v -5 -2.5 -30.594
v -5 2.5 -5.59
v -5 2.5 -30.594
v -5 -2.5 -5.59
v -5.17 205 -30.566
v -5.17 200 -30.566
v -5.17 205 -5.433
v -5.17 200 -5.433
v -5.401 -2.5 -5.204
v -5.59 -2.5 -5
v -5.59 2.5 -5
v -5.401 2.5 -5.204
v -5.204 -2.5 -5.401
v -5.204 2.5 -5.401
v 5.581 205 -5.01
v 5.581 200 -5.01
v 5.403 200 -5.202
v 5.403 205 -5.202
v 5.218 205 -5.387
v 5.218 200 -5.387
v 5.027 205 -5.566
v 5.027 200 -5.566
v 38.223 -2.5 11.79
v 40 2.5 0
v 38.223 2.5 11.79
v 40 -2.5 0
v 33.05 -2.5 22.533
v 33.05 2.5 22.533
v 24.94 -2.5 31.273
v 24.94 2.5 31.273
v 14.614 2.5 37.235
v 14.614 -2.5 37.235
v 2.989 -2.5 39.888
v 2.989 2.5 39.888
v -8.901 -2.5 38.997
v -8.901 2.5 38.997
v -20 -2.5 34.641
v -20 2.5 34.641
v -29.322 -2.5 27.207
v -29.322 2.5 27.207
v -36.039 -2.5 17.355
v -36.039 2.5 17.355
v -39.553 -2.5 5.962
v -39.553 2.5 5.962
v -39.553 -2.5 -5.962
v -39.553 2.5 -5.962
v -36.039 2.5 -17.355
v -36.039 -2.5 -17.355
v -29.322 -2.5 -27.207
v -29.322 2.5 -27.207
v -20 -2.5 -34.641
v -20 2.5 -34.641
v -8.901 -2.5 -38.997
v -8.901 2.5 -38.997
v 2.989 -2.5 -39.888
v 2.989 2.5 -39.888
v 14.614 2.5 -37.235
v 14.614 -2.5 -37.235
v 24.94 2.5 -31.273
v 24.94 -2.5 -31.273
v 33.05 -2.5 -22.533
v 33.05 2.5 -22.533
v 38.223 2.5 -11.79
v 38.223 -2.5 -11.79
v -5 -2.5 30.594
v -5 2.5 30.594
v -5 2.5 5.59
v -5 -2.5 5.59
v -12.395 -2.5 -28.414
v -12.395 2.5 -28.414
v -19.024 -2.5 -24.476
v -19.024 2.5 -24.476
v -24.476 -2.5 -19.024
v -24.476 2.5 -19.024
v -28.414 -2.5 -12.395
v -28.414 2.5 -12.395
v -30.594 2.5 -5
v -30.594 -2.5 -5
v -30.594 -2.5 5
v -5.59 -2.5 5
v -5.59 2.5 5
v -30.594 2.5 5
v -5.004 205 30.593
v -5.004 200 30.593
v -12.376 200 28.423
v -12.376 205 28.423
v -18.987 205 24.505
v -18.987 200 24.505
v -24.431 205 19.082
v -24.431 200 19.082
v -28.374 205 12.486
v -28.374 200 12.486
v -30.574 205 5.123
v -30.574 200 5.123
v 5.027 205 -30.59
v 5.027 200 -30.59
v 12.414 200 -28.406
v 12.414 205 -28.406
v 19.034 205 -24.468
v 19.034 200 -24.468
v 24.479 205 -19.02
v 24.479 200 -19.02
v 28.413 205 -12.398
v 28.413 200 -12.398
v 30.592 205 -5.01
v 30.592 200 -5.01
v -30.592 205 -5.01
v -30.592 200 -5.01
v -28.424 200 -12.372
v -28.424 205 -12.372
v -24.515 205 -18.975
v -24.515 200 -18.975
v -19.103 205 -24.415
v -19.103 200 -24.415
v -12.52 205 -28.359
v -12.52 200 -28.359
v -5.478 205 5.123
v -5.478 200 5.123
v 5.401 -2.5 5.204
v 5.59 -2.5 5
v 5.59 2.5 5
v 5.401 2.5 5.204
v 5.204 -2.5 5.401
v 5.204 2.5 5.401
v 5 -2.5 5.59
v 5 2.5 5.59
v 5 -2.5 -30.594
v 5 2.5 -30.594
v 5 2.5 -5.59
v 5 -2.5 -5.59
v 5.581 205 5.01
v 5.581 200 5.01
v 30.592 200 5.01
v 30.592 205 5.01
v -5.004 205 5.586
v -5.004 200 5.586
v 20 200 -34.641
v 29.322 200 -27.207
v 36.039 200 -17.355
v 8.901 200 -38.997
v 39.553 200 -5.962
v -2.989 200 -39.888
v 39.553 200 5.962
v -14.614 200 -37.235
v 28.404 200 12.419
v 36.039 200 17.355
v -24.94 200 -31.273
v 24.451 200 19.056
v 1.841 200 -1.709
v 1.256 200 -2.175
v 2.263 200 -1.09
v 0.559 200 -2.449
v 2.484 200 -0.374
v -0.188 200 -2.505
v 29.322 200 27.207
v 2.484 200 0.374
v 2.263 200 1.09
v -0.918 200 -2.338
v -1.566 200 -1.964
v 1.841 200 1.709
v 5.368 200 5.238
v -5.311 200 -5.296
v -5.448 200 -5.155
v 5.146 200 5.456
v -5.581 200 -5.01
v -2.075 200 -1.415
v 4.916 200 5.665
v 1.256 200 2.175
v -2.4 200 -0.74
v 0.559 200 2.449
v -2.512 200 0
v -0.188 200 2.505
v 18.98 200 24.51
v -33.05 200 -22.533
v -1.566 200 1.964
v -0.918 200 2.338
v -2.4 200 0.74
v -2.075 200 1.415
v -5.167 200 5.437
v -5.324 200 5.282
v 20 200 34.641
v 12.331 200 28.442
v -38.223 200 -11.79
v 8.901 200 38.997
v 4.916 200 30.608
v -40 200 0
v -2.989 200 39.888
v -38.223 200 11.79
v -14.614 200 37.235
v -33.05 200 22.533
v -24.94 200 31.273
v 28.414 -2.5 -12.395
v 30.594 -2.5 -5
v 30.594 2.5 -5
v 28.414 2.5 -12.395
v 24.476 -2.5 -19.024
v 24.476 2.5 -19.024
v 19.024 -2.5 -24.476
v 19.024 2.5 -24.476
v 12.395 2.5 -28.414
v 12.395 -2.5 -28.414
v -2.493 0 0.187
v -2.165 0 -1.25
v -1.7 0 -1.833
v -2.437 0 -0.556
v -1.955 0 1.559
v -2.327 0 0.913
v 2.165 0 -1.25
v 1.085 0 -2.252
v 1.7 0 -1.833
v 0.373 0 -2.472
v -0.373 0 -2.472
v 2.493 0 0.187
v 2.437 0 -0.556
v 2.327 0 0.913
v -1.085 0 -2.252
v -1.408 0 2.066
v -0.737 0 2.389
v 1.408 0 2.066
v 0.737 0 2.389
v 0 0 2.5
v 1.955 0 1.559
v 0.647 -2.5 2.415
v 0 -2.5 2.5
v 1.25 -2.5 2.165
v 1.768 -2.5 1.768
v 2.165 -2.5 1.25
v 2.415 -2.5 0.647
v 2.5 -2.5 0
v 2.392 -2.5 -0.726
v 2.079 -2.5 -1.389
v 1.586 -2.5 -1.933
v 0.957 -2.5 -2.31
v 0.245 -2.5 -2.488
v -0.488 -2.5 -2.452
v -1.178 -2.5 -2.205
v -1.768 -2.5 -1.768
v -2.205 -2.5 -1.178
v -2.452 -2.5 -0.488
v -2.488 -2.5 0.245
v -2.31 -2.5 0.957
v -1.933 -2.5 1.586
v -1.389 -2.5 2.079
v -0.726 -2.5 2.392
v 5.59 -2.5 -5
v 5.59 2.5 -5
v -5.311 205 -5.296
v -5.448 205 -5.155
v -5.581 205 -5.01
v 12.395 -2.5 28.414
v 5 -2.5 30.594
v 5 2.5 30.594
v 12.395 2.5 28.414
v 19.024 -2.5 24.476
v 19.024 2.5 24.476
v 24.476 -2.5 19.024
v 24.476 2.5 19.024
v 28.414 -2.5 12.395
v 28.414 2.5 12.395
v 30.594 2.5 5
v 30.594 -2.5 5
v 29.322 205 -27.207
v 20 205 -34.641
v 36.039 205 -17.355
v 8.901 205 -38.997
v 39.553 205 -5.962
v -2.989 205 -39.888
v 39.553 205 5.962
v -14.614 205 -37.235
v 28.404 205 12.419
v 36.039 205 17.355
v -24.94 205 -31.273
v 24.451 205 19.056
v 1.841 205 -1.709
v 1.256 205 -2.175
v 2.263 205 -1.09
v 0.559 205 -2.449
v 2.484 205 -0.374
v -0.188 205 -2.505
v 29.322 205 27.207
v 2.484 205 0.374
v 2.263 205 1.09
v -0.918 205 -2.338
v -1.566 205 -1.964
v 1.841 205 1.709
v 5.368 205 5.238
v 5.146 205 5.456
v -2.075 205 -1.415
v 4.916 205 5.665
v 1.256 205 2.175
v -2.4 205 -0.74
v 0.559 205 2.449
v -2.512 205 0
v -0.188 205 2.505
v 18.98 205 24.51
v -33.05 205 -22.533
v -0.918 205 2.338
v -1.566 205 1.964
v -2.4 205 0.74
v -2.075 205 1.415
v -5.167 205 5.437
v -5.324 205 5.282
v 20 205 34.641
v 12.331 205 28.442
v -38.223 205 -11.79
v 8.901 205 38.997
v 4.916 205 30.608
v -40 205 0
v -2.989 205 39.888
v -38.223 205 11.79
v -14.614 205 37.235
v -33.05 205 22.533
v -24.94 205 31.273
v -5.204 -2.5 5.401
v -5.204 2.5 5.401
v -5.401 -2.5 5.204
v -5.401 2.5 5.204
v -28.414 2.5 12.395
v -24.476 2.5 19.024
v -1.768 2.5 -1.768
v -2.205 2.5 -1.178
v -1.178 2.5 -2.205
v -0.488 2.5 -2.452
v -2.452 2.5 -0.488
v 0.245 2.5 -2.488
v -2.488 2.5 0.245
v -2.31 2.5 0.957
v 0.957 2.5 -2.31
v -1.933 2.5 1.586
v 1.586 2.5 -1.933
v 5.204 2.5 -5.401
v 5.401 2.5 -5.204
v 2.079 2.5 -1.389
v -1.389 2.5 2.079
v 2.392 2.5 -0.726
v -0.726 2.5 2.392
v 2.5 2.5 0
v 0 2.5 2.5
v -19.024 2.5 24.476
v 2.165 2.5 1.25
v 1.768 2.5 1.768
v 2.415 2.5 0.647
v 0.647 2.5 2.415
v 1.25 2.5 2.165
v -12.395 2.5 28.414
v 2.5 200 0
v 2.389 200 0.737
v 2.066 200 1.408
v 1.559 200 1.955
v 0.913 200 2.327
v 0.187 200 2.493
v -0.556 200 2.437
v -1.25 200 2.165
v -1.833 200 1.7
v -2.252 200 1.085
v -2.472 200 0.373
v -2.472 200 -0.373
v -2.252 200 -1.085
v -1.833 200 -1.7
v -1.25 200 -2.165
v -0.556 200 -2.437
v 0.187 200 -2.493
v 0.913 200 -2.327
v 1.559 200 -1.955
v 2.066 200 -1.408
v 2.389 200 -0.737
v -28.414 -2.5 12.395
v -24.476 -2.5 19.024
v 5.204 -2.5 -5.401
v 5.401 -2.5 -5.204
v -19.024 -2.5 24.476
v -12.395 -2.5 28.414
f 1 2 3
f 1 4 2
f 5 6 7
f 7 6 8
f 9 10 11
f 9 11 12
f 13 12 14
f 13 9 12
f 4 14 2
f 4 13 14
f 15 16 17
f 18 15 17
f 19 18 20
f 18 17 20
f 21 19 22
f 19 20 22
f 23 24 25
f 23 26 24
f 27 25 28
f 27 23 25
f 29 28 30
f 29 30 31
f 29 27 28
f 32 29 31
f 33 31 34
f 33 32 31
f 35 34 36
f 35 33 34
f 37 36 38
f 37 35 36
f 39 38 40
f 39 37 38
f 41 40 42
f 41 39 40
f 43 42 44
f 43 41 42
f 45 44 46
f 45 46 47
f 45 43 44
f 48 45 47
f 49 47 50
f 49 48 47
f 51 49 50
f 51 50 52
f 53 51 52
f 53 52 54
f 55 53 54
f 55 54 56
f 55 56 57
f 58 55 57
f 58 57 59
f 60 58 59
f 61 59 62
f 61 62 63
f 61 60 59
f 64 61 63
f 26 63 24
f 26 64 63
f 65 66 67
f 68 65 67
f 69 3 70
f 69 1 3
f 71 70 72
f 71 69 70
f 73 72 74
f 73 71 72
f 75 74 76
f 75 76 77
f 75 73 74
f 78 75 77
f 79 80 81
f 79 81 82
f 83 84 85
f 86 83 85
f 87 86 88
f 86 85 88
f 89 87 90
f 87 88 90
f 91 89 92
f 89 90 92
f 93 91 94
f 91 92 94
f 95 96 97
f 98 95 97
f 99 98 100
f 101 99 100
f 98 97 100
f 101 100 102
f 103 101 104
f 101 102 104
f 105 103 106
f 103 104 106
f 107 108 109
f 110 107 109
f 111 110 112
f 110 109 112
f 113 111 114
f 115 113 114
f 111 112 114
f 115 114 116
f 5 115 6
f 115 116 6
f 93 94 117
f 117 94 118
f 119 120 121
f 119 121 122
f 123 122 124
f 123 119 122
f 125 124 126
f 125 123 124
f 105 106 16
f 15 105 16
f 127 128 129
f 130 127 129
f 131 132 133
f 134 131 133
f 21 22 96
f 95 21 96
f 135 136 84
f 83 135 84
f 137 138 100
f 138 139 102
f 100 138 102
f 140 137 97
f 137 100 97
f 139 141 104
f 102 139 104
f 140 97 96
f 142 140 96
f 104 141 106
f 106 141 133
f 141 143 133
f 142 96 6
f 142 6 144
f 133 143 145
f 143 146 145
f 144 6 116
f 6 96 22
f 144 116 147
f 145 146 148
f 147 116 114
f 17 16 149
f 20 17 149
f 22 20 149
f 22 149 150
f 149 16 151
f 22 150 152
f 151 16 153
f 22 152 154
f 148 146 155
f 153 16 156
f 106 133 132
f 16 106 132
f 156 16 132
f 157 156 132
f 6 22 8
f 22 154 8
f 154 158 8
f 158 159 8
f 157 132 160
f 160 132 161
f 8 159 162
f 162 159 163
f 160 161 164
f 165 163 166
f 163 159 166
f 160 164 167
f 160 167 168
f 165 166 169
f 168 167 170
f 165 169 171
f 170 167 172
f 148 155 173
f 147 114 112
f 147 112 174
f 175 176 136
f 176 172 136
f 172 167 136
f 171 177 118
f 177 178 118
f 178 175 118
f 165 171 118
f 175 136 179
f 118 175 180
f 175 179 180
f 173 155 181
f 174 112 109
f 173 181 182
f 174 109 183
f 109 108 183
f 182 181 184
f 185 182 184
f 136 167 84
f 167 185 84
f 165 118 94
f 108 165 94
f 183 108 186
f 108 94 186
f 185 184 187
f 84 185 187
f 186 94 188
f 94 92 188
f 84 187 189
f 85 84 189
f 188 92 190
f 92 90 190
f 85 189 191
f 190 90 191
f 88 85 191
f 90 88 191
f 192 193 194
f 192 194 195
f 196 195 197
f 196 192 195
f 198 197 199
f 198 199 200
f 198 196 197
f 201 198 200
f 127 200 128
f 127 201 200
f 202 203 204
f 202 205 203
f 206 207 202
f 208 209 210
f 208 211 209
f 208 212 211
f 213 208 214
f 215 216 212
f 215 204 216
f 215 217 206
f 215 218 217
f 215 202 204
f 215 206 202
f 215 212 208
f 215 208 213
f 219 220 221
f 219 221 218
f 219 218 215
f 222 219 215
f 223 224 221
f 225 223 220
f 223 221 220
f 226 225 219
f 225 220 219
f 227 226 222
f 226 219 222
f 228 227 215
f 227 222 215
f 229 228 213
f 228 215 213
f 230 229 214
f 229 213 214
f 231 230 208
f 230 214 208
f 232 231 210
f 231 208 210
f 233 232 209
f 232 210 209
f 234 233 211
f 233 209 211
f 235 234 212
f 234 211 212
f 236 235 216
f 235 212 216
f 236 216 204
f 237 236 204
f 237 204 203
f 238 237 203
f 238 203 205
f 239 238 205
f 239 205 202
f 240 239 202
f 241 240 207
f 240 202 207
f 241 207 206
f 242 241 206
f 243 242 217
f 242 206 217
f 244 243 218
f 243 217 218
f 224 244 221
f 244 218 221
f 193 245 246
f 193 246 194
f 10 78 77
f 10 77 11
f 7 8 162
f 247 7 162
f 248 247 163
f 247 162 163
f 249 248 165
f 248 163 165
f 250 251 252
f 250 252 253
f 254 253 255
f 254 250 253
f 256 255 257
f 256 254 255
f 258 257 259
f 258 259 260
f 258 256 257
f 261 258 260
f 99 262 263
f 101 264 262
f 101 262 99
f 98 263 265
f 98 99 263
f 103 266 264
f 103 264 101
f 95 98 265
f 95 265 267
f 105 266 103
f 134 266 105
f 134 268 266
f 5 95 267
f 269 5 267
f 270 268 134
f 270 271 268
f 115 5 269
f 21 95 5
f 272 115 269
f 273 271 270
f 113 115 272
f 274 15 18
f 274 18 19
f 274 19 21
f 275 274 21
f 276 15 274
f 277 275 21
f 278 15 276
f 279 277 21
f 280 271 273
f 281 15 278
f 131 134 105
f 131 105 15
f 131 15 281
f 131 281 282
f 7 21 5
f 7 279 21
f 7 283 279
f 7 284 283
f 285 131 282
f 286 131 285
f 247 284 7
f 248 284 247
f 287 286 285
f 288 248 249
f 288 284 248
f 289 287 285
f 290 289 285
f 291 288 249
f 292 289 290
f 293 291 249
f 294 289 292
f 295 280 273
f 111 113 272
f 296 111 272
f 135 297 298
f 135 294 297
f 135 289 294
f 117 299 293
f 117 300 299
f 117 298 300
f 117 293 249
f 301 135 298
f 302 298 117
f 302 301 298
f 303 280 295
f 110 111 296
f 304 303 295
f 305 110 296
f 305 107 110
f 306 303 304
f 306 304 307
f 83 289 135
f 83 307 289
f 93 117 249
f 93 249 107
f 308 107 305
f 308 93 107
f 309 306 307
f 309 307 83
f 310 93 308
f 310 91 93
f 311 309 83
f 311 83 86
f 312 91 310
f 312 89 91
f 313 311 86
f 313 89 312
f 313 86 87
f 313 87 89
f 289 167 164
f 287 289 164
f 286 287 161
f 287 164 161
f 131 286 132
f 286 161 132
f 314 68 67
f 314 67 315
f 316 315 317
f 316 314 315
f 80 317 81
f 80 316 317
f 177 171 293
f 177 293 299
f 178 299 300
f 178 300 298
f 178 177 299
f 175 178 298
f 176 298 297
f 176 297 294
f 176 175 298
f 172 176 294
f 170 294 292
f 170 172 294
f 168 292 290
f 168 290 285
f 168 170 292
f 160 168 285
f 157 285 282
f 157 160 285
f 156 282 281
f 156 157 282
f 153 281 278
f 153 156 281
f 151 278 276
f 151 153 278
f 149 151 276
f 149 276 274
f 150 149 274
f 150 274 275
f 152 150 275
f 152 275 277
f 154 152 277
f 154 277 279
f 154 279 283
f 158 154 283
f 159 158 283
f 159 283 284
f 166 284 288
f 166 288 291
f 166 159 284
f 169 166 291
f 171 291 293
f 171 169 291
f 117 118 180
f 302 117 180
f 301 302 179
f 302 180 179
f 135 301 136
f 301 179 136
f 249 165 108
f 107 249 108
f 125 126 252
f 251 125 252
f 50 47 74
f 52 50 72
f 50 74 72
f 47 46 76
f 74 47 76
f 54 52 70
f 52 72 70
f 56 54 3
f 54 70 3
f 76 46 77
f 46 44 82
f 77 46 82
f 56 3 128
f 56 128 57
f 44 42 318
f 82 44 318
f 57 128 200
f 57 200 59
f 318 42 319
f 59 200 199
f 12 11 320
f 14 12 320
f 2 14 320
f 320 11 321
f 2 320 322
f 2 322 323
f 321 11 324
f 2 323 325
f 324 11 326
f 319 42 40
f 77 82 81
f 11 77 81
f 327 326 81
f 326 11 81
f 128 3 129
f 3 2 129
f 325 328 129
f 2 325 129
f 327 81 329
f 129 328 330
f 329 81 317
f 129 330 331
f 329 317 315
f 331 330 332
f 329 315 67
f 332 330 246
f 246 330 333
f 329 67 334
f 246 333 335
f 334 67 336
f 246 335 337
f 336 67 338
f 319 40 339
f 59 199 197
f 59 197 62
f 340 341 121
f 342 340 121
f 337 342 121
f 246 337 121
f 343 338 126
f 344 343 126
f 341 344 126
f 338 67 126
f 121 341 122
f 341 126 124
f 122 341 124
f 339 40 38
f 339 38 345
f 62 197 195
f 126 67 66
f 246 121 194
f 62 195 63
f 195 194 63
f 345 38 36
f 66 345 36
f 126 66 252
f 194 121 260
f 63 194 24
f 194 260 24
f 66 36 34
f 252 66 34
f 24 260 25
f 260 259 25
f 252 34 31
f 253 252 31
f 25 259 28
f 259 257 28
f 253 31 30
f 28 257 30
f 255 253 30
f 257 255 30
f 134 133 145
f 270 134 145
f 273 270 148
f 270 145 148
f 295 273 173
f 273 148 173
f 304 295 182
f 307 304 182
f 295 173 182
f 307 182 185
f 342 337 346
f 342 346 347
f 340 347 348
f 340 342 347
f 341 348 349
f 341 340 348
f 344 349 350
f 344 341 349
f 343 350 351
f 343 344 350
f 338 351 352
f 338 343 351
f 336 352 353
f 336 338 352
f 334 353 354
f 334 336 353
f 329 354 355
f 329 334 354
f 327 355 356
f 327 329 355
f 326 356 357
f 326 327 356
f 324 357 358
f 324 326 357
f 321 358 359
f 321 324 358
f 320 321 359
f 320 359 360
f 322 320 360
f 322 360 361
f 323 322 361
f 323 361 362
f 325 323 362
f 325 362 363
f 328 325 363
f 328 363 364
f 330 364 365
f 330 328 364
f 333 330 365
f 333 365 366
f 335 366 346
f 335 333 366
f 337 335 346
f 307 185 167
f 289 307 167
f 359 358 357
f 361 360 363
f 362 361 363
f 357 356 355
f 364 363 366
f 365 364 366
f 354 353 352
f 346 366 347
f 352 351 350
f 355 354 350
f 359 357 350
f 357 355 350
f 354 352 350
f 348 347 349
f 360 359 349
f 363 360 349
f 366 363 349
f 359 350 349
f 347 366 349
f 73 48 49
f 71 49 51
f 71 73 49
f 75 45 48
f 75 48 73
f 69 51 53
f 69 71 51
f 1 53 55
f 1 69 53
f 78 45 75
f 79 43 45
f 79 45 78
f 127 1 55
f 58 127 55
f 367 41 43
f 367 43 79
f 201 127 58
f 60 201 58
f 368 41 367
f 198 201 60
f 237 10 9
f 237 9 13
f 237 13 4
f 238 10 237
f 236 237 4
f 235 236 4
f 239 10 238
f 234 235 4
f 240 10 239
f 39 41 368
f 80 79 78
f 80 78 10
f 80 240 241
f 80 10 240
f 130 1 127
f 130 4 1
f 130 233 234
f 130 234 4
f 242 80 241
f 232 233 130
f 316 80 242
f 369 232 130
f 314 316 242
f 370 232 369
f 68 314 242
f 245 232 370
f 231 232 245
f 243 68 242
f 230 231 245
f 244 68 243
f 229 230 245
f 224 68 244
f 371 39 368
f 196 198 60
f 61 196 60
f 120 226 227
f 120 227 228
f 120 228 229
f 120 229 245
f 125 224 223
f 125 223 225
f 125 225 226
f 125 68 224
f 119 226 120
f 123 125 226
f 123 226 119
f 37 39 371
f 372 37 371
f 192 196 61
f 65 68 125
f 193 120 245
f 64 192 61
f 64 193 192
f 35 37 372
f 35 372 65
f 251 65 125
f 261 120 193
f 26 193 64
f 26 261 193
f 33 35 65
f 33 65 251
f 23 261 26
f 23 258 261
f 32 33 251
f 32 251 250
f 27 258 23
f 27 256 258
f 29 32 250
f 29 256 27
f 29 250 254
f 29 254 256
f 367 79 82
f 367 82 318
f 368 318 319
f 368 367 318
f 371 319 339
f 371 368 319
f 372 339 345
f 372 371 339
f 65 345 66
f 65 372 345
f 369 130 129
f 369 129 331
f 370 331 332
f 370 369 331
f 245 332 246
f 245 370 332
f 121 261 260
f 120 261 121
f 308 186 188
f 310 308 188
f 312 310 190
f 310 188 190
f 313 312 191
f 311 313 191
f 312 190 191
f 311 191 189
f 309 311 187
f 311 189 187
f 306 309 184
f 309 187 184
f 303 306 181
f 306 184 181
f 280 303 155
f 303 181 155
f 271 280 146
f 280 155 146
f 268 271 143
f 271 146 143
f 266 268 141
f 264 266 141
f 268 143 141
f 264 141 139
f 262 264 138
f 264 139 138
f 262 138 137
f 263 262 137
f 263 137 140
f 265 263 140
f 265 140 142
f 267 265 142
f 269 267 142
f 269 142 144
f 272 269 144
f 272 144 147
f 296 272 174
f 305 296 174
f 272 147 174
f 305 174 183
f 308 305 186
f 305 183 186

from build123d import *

# Parameters (mm, degrees)
F0_R     = 40
F1_DEPTH = 2.5
F2_R     = 2.5
F3_DEPTH = 200
F4_R     = 40
F4_R_2   = 2.5119602208
F5_DEPTH = 5


with BuildPart() as f1:
    # F0 (on Front) → F1 (new body, symmetric)
    with BuildSketch(Plane.XZ):
        Circle(F0_R)
        with BuildLine():
            Line((-30.5941170816, -5), (-5.5901699437, -5))
            ThreePointArc((-5.5901699437, -5), (-5.3033008589, -5.3033008589), (-5, -5.5901699437))
            Line((-5, -5.5901699437), (-5, -30.5941170816))
            ThreePointArc((-5, -30.5941170816), (-21.9203102168, -21.9203102168), (-30.5941170816, -5))
        make_face(mode=Mode.SUBTRACT)
        with BuildLine():
            ThreePointArc((30.5941170816, -5), (21.9203101767, -21.9203102568), (4.9999998882, -30.5941170998))
            Line((4.9999998882, -30.5941170998), (4.9999998882, -5.5901700437))
            ThreePointArc((4.9999998882, -5.5901700437), (5.3033008059, -5.3033009119), (5.5901699437, -5))
            Line((5.5901699437, -5), (30.5941170816, -5))
        make_face(mode=Mode.SUBTRACT)
        with BuildLine():
            ThreePointArc((-30.5941170998, 4.9999998882), (-21.9203102568, 21.9203101767), (-5, 30.5941170816))
            Line((-5, 30.5941170816), (-5, 5.5901699437))
            ThreePointArc((-5, 5.5901699437), (-5.3033009119, 5.3033008059), (-5.5901700437, 4.9999998882))
            Line((-5.5901700437, 4.9999998882), (-30.5941170998, 4.9999998882))
        make_face(mode=Mode.SUBTRACT)
        with BuildLine():
            ThreePointArc((0, 2.5), (1.767766953, 1.767766953), (2.5, 0))
            ThreePointArc((2.5, 0), (-1.767766953, -1.767766953), (0, 2.5))
        make_face(mode=Mode.SUBTRACT)
        with BuildLine():
            Line((4.9999998882, 5.5901700437), (4.9999998882, 30.5941170998))
            ThreePointArc((4.9999998882, 30.5941170998), (21.9203102168, 21.9203102168), (30.5941170998, 4.9999998882))
            Line((30.5941170998, 4.9999998882), (5.5901700437, 4.9999998882))
            ThreePointArc((5.5901700437, 4.9999998882), (5.3033008589, 5.3033008589), (4.9999998882, 5.5901700437))
        make_face(mode=Mode.SUBTRACT)
    extrude(amount=F1_DEPTH, both=True)

    # F2 (on Front) → F3 (join)
    with BuildSketch(Plane.XZ):
        Circle(F2_R)
    extrude(amount=-F3_DEPTH)


with BuildPart() as f5:
    # F4 (on face) → F5 (new body)
    with BuildSketch(Plane(origin=(0, 200, 0), x_dir=(-1, 0, 0), z_dir=(0, 1, 0))):
        Circle(F4_R)
        with BuildLine():
            ThreePointArc((-5.0273663049, -30.589632035), (-21.9264035722, -21.9142151671), (-30.5924226853, -5.0103566985))
            Line((-30.5924226853, -5.0103566985), (-5.5808893335, -5.0103566985))
            ThreePointArc((-5.5808893335, -5.0103566985), (-5.3113875625, -5.2952018055), (-5.0273663049, -5.565571672))
            Line((-5.0273663049, -5.565571672), (-5.0273663049, -30.589632035))
        make_face(mode=Mode.SUBTRACT)
        with BuildLine():
            Line((5.17042936, -30.5657759632), (5.17042936, -5.4329237279))
            ThreePointArc((5.17042936, -5.4329237279), (5.3798098606, -5.2256718098), (5.5808893335, -5.0103566985))
            Line((5.5808893335, -5.0103566985), (30.5924226853, -5.0103566985))
            ThreePointArc((30.5924226853, -5.0103566985), (21.9776081513, -21.862862117), (5.17042936, -30.5657759632))
        make_face(mode=Mode.SUBTRACT)
        with BuildLine():
            ThreePointArc((-4.9155800954, 5.6645452002), (-5.2584178483, 5.3478071892), (-5.5808893335, 5.0103566985))
            Line((-5.5808893335, 5.0103566985), (-30.5924226853, 5.0103566985))
            ThreePointArc((-30.5924226853, 5.0103566985), (-21.8863374824, 21.9542303806), (-4.9155800954, 30.6077943068))
            Line((-4.9155800954, 30.6077943068), (-4.9155800954, 5.6645452002))
        make_face(mode=Mode.SUBTRACT)
        Circle(F4_R_2, mode=Mode.SUBTRACT)
        with BuildLine():
            ThreePointArc((5.0041761406, 30.5934342818), (21.8777248123, 21.9628130492), (30.5737790837, 5.1228929856))
            Line((30.5737790837, 5.1228929856), (5.4777702998, 5.1228929856))
            ThreePointArc((5.4777702998, 5.1228929856), (5.2460954406, 5.3598957666), (5.0041761406, 5.5864318804))
            Line((5.0041761406, 5.5864318804), (5.0041761406, 30.5934342818))
        make_face(mode=Mode.SUBTRACT)
    extrude(amount=F5_DEPTH)


solid = Compound([f1.part, f5.part])
